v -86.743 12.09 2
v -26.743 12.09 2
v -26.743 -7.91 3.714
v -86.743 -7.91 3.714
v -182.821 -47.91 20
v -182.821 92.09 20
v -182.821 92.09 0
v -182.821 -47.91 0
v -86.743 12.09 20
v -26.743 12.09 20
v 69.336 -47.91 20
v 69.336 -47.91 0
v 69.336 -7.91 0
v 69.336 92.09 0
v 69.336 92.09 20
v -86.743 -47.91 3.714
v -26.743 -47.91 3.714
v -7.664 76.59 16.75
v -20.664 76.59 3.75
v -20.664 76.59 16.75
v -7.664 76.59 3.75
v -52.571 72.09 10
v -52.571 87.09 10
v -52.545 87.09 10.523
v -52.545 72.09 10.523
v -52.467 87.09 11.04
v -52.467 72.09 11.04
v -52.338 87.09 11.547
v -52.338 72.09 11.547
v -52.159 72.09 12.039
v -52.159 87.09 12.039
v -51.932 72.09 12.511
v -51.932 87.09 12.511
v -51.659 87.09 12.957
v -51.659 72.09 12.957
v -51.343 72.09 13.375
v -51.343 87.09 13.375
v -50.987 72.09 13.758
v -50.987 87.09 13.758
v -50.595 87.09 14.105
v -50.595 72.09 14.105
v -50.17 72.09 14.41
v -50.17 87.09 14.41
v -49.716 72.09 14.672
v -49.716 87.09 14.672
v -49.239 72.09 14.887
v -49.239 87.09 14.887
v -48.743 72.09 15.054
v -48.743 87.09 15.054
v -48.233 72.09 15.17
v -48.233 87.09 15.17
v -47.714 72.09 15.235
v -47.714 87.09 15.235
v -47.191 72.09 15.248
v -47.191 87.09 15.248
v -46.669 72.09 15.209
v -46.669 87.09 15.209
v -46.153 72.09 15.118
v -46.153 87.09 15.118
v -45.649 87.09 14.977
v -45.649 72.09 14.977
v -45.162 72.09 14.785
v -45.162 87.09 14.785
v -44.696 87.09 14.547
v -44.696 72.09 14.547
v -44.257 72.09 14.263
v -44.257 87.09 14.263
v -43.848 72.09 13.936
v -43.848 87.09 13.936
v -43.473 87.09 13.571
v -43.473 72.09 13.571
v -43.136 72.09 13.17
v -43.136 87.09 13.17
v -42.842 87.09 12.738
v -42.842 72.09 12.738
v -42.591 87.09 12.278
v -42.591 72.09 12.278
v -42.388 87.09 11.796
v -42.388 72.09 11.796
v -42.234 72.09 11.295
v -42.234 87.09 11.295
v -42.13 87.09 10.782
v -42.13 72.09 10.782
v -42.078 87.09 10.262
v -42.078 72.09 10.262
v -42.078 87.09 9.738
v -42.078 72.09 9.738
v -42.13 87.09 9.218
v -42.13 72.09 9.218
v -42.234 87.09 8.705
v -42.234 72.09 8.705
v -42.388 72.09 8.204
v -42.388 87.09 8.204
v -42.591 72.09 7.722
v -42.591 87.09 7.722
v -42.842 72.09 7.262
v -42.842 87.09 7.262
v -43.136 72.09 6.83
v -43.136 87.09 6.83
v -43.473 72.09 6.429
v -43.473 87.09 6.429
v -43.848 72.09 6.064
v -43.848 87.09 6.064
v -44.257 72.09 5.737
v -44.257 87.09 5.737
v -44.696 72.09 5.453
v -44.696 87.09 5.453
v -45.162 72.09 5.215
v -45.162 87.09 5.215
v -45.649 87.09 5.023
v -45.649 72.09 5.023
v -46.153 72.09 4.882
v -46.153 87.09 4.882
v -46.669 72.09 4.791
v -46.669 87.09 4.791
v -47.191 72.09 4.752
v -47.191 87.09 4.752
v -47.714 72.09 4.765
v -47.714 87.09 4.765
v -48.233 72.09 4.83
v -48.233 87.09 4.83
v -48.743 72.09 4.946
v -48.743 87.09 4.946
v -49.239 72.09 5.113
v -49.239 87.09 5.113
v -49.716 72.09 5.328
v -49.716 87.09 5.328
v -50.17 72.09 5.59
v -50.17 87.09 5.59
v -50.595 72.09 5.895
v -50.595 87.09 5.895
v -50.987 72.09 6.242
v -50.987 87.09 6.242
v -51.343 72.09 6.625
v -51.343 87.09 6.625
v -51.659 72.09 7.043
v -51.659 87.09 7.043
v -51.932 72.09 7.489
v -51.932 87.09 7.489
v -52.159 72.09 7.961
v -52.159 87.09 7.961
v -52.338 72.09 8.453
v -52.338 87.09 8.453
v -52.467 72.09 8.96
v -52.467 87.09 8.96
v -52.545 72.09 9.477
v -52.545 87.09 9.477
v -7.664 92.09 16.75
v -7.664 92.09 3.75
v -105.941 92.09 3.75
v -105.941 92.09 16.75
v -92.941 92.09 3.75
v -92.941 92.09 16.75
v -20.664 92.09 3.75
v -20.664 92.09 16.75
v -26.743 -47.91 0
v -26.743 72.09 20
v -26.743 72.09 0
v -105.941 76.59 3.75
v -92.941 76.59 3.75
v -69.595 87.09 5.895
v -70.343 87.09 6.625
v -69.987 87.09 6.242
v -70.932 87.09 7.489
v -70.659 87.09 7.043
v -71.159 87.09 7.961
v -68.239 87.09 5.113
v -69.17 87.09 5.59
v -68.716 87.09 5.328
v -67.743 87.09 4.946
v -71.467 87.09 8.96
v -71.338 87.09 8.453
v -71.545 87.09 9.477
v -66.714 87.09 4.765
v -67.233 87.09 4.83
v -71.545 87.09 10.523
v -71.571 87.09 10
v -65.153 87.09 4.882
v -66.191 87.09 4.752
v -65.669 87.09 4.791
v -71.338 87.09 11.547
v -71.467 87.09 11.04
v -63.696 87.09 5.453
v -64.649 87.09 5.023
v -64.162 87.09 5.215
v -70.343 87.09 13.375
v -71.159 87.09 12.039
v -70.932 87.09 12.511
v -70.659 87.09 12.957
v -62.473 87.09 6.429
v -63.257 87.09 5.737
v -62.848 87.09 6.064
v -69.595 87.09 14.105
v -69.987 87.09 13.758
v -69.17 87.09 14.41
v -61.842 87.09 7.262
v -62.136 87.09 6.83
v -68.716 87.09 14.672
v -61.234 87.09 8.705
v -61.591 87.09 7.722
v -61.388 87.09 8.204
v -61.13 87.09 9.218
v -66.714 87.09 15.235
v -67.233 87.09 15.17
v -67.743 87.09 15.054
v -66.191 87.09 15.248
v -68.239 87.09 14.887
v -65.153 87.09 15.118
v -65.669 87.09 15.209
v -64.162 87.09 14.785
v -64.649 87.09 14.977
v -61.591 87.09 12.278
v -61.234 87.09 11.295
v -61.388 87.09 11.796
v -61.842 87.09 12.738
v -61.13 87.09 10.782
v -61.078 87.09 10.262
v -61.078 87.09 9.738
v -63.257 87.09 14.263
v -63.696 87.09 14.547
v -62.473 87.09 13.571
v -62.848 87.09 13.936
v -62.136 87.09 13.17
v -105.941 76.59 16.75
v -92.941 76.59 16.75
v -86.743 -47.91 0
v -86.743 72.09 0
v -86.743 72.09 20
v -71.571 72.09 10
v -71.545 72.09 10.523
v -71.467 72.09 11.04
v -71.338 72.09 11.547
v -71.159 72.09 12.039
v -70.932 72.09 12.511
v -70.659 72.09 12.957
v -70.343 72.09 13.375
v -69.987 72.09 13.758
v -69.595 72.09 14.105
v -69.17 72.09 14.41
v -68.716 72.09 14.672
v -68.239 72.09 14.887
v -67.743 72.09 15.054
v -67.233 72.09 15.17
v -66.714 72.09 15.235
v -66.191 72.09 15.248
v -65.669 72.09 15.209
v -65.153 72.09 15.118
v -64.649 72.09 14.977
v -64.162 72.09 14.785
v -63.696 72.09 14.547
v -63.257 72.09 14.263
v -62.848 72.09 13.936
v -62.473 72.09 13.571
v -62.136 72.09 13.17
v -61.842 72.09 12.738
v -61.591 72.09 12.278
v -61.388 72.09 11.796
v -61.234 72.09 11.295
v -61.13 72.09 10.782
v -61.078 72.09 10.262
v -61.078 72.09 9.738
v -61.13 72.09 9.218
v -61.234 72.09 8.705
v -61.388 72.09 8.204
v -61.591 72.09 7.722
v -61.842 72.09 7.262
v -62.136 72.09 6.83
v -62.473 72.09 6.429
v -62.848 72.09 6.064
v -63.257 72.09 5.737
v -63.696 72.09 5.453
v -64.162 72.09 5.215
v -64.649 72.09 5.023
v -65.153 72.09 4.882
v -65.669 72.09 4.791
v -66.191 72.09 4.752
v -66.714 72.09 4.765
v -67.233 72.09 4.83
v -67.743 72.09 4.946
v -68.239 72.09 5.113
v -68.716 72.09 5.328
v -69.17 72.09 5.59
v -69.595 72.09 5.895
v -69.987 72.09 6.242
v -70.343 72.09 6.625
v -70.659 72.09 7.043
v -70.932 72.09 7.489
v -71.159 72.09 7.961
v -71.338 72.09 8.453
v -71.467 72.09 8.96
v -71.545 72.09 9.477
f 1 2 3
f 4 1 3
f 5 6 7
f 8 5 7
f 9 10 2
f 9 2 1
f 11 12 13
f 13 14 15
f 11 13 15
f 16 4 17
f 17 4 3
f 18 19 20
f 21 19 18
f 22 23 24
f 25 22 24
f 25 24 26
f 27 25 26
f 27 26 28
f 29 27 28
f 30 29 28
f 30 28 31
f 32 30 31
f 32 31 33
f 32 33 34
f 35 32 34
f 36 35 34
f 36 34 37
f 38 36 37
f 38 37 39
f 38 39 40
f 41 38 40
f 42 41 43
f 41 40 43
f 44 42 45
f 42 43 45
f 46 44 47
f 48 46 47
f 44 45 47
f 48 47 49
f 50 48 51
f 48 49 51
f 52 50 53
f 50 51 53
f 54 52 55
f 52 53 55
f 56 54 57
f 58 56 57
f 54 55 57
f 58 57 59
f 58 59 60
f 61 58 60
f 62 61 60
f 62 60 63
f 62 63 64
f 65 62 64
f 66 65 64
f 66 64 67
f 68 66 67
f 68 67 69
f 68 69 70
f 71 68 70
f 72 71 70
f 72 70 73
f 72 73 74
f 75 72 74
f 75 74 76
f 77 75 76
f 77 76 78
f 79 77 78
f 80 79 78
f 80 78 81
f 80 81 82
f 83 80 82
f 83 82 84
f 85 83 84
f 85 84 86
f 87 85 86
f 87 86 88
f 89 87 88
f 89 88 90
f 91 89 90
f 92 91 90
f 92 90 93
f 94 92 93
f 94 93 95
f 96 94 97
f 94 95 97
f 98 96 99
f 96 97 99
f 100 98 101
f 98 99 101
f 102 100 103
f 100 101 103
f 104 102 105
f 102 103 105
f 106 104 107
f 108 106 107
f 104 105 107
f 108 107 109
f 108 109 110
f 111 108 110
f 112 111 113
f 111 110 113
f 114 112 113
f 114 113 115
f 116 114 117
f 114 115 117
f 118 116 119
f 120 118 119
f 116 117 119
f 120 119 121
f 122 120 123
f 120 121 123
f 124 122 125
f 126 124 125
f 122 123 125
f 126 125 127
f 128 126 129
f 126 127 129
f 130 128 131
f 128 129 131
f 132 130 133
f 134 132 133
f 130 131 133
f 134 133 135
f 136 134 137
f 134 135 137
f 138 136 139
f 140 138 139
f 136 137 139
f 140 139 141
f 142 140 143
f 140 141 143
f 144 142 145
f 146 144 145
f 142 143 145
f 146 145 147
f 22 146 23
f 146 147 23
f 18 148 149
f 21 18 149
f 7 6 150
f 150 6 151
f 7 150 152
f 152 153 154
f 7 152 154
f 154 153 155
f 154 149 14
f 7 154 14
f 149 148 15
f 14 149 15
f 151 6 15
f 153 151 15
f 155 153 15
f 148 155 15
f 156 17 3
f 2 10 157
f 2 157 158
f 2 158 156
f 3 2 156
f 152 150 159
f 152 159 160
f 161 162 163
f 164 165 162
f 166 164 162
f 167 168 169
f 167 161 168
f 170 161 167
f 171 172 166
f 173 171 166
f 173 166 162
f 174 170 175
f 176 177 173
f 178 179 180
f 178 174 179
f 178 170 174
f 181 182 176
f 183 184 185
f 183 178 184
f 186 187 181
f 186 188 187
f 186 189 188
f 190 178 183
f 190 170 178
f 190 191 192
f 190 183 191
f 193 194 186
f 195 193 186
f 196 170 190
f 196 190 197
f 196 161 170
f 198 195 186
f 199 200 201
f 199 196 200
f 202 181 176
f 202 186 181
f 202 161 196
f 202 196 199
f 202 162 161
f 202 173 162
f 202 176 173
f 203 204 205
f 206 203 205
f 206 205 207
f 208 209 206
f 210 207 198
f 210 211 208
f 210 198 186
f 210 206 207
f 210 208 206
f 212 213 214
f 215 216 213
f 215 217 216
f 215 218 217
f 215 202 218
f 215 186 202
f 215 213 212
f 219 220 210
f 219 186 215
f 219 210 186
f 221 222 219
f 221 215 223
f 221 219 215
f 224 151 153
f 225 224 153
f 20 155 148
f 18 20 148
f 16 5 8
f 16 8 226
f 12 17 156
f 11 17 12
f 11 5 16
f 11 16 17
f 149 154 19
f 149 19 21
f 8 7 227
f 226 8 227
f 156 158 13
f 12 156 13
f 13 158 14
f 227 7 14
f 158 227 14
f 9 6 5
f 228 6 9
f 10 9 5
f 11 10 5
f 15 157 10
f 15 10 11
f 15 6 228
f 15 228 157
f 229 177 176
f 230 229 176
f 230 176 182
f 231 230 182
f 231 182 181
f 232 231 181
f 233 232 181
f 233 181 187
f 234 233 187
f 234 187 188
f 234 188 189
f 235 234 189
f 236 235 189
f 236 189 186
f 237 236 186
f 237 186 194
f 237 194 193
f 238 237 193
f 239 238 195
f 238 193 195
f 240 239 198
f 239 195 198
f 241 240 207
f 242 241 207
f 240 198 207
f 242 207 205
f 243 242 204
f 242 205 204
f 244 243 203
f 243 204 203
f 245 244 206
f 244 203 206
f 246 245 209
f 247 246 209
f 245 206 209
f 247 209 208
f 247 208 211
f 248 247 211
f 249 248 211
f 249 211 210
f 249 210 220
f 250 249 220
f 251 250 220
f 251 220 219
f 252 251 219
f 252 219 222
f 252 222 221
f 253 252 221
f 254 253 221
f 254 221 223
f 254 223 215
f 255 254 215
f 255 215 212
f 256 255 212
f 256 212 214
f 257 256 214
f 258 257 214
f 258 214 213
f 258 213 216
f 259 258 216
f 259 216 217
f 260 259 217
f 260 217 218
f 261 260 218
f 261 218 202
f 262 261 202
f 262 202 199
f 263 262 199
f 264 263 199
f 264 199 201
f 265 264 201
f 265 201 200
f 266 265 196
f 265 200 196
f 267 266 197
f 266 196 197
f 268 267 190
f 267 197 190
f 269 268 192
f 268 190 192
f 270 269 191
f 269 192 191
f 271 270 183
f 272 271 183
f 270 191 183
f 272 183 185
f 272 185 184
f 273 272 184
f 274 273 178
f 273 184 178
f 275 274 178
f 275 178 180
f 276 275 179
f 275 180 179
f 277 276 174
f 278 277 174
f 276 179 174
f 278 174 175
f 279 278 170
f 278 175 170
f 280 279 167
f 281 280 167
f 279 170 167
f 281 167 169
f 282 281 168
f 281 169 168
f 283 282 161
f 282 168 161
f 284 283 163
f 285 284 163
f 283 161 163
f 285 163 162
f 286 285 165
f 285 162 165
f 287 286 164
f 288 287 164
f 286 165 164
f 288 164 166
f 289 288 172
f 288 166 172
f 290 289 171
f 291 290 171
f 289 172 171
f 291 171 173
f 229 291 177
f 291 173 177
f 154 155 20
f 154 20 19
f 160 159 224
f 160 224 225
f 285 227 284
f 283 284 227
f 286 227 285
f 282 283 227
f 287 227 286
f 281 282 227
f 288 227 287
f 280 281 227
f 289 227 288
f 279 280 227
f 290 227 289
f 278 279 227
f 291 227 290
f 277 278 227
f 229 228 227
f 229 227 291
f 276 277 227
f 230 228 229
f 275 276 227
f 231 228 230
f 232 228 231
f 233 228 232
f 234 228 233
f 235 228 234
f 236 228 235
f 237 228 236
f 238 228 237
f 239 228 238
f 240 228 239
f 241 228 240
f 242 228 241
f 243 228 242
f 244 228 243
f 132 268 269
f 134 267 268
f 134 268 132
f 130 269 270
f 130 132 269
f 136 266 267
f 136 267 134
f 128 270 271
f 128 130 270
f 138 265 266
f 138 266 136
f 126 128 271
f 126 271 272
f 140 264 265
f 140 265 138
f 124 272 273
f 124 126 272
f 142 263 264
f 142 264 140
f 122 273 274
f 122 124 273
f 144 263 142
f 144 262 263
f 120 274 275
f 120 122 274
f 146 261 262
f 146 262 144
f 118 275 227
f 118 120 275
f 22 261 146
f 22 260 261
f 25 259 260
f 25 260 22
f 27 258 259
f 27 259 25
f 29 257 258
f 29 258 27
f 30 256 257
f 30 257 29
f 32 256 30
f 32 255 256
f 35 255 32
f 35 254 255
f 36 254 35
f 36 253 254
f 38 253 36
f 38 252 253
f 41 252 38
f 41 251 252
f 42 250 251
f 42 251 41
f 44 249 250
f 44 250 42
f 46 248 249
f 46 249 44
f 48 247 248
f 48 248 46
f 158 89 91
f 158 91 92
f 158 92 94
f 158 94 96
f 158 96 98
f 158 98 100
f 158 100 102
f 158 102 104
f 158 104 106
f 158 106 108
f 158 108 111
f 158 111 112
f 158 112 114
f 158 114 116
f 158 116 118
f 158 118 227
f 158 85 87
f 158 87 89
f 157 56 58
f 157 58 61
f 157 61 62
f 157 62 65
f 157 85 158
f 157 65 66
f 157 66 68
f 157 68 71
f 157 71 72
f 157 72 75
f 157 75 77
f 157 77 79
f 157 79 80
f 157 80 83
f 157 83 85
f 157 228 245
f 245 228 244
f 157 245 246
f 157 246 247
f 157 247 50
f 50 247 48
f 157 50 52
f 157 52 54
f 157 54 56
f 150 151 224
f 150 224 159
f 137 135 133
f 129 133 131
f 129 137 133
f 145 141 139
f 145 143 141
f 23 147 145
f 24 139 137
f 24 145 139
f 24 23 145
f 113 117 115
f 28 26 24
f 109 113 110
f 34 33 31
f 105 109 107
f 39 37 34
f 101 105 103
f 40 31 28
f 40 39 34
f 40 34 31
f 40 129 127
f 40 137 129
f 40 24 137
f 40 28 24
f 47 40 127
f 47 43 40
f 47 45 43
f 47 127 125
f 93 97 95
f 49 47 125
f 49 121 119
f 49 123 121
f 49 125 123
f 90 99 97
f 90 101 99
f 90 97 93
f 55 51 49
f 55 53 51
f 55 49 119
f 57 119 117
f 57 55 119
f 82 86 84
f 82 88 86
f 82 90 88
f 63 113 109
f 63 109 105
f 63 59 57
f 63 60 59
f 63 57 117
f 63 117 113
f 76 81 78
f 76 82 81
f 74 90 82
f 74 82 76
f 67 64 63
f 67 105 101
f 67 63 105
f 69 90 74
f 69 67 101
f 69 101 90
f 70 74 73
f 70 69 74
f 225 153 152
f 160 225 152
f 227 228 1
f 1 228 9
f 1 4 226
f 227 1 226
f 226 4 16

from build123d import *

# Parameters (mm, degrees)
BOSS_EXTRUDE1_DEPTH = 20
SKETCH5_R           = 5.25
CUT_EXTRUDE4_DEPTH  = 20
SKETCH6_W           = 13
SKETCH6_H           = 13
CUT_EXTRUDE5_DEPTH  = 15.5
SKETCH7_W           = 13
SKETCH7_H           = 13
CUT_EXTRUDE6_DEPTH  = 15.5
SKETCH8_W           = 300
SKETCH8_H           = 102
BOSS_EXTRUDE2_DEPTH = 20
CUT_EXTRUDE7_START  = -150
SKETCH9_W           = 47.842391085
SKETCH9_H           = 20
CUT_EXTRUDE7_DEPTH  = 150
CUT_EXTRUDE9_DEPTH  = 40
CUT_EXTRUDE10_DEPTH = 60
SKETCH17_W          = 60
SKETCH17_H          = 5
CUT_EXTRUDE12_DEPTH = 38
CUT_EXTRUDE13_DEPTH = 60
SKETCH10_W          = 252.157608915
SKETCH10_H          = 50
CUT_EXTRUDE8_DEPTH  = 310
BOSS_EXTRUDE3_DEPTH = 50
SKETCH21_W          = 252.157608915
SKETCH21_H          = 10
CUT_EXTRUDE14_DEPTH = 54
SKETCH23_W          = 60
SKETCH23_H          = 5
BOSS_EXTRUDE5_DEPTH = 20
CUT_EXTRUDE15_DEPTH = 20
SKETCH22_W          = 60
SKETCH22_H          = 5
BOSS_EXTRUDE4_DEPTH = 20


with BuildPart() as part:
    # Sketch1 → Boss-Extrude1 (new body)
    with BuildSketch(Plane.XY):
        Polygon((-107.821386225, 92.09039548), (-7.821386225, 92.09039548), (117.178613775, 92.09039548), (117.178613775, 44.09039548), (-7.821386225, 44.09039548), (-107.821386225, 44.09039548), (-182.821386225, 44.09039548), (-182.821386225, 92.09039548), align=None)
    extrude(amount=BOSS_EXTRUDE1_DEPTH)

    # Sketch5 → Cut-Extrude4 (cut)
    with BuildSketch(Plane(origin=(0, 92.09039548, 0), x_dir=(1, 0, 0), z_dir=(0, 1, 0))):
        with Locations(Location((-66.321386225, -10, 0), (0, 0, 180))):
            Circle(SKETCH5_R)
        with Locations(Location((-47.321386225, -10, 0), (0, 0, 180))):
            Circle(SKETCH5_R)
    extrude(amount=-CUT_EXTRUDE4_DEPTH, mode=Mode.SUBTRACT)

    # Sketch6 → Cut-Extrude5 (cut)
    with BuildSketch(Plane(origin=(0, 92.09039548, 0), x_dir=(1, 0, 0), z_dir=(0, 1, 0))):
        with Locations((-99.441386225, -10.25)):
            Rectangle(SKETCH6_W, SKETCH6_H)
    extrude(amount=-CUT_EXTRUDE5_DEPTH, mode=Mode.SUBTRACT)

    # Sketch7 → Cut-Extrude6 (cut)
    with BuildSketch(Plane(origin=(0, 92.09039548, 0), x_dir=(1, 0, 0), z_dir=(0, 1, 0))):
        with Locations((-14.16377731, -10.25)):
            Rectangle(SKETCH7_W, SKETCH7_H)
    extrude(amount=-CUT_EXTRUDE6_DEPTH, mode=Mode.SUBTRACT)

    # Sketch8 → Boss-Extrude2 (add)
    with BuildSketch(Plane.XY.offset(20)):
        with Locations((-32.821386225, -6.90960452)):
            Rectangle(SKETCH8_W, SKETCH8_H)
    extrude(amount=-BOSS_EXTRUDE2_DEPTH)

    # Sketch9 → Cut-Extrude7 (cut)
    with BuildSketch(Plane(origin=(0, 92.09039548, 0), x_dir=(1, 0, 0), z_dir=(0, 1, 0)).offset(CUT_EXTRUDE7_START)):
        with Locations((93.257418233, -10)):
            Rectangle(SKETCH9_W, SKETCH9_H)
    extrude(amount=CUT_EXTRUDE7_DEPTH, mode=Mode.SUBTRACT)

    # Sketch11 → Cut-Extrude9 (cut)
    with BuildSketch(Plane.XY.offset(20)):
        Polygon((-26.742581768, 62.09039548), (-26.742581768, 12.09039548), (-86.742581768, 12.09039548), (-86.742581768, 62.09039548), (-86.742581768, 64.09039548), (-26.742581768, 64.09039548), align=None)
    extrude(amount=-CUT_EXTRUDE9_DEPTH, mode=Mode.SUBTRACT)

    # Sketch14 → Cut-Extrude10 (cut)
    with BuildSketch(Plane(origin=(-86.742581768, 0, 0), x_dir=(0, 0, -1), z_dir=(1, 0, 0))):
        Polygon((0, 64.09039548), (-20, 67.09039548), (-20, 64.09039548), align=None)
    extrude(amount=CUT_EXTRUDE10_DEPTH, mode=Mode.SUBTRACT)

    # Sketch17 → Cut-Extrude12 (cut)
    with BuildSketch(Plane(origin=(0, 0, 0), x_dir=(-1, 0, 0), z_dir=(0, 0, -1))):
        with Locations((56.742581768, 89.59039548)):
            Rectangle(SKETCH17_W, SKETCH17_H)
    extrude(amount=-CUT_EXTRUDE12_DEPTH, mode=Mode.SUBTRACT)

    # Sketch19 → Cut-Extrude13 (cut)
    with BuildSketch(Plane.ZY.offset(26.742581768)):
        Polygon((0, 12.09039548), (2, 12.09039548), (8, -57.90960452), (0, -57.90960452), align=None)
    extrude(amount=CUT_EXTRUDE13_DEPTH, mode=Mode.SUBTRACT)

    # Sketch10 → Cut-Extrude8 (cut)
    with BuildSketch(Plane(origin=(0, 0, 0), x_dir=(-1, 0, 0), z_dir=(0, 0, -1))):
        with Locations((56.742581767, -32.90960452)):
            Rectangle(SKETCH10_W, SKETCH10_H)
    extrude(amount=-CUT_EXTRUDE8_DEPTH, mode=Mode.SUBTRACT)

    # Sketch20 → Boss-Extrude3 (add)
    with BuildSketch(Plane.XZ.offset(7.90960452)):
        Polygon((69.33622269, 20), (-182.821386225, 20), (-182.821386225, 0), (-86.742581768, 0), (-86.742581768, 3.714285714), (-26.742581768, 3.714285714), (-26.742581768, 0), (69.33622269, 0), align=None)
    extrude(amount=BOSS_EXTRUDE3_DEPTH)

    # Sketch21 → Cut-Extrude14 (cut)
    with BuildSketch(Plane.XY.offset(20)):
        with Locations((-56.742581767, -52.90960452)):
            Rectangle(SKETCH21_W, SKETCH21_H)
    extrude(amount=-CUT_EXTRUDE14_DEPTH, mode=Mode.SUBTRACT)

    # Sketch23 → Boss-Extrude5 (add)
    with BuildSketch(Plane.XY.offset(20)):
        with Locations((-56.742581768, 89.59039548)):
            Rectangle(SKETCH23_W, SKETCH23_H)
    extrude(amount=-BOSS_EXTRUDE5_DEPTH)

    # Sketch24 → Cut-Extrude15 (cut)
    with BuildSketch(Plane.XY.offset(20)):
        Polygon((-86.742581768, 67.09039548), (-86.742581768, 72.09039548), (-26.742581768, 72.09039548), (-26.742581768, 67.09039548), (-26.742581768, 61.01073747), (-86.742581768, 61.01073747), align=None)
    extrude(amount=-CUT_EXTRUDE15_DEPTH, mode=Mode.SUBTRACT)

    # Sketch22 → Boss-Extrude4 (add)
    with BuildSketch(Plane.XY.offset(20)):
        with Locations((-56.742581768, 89.59039548)):
            Rectangle(SKETCH22_W, SKETCH22_H)
    extrude(amount=-BOSS_EXTRUDE4_DEPTH)


solid = part.part
